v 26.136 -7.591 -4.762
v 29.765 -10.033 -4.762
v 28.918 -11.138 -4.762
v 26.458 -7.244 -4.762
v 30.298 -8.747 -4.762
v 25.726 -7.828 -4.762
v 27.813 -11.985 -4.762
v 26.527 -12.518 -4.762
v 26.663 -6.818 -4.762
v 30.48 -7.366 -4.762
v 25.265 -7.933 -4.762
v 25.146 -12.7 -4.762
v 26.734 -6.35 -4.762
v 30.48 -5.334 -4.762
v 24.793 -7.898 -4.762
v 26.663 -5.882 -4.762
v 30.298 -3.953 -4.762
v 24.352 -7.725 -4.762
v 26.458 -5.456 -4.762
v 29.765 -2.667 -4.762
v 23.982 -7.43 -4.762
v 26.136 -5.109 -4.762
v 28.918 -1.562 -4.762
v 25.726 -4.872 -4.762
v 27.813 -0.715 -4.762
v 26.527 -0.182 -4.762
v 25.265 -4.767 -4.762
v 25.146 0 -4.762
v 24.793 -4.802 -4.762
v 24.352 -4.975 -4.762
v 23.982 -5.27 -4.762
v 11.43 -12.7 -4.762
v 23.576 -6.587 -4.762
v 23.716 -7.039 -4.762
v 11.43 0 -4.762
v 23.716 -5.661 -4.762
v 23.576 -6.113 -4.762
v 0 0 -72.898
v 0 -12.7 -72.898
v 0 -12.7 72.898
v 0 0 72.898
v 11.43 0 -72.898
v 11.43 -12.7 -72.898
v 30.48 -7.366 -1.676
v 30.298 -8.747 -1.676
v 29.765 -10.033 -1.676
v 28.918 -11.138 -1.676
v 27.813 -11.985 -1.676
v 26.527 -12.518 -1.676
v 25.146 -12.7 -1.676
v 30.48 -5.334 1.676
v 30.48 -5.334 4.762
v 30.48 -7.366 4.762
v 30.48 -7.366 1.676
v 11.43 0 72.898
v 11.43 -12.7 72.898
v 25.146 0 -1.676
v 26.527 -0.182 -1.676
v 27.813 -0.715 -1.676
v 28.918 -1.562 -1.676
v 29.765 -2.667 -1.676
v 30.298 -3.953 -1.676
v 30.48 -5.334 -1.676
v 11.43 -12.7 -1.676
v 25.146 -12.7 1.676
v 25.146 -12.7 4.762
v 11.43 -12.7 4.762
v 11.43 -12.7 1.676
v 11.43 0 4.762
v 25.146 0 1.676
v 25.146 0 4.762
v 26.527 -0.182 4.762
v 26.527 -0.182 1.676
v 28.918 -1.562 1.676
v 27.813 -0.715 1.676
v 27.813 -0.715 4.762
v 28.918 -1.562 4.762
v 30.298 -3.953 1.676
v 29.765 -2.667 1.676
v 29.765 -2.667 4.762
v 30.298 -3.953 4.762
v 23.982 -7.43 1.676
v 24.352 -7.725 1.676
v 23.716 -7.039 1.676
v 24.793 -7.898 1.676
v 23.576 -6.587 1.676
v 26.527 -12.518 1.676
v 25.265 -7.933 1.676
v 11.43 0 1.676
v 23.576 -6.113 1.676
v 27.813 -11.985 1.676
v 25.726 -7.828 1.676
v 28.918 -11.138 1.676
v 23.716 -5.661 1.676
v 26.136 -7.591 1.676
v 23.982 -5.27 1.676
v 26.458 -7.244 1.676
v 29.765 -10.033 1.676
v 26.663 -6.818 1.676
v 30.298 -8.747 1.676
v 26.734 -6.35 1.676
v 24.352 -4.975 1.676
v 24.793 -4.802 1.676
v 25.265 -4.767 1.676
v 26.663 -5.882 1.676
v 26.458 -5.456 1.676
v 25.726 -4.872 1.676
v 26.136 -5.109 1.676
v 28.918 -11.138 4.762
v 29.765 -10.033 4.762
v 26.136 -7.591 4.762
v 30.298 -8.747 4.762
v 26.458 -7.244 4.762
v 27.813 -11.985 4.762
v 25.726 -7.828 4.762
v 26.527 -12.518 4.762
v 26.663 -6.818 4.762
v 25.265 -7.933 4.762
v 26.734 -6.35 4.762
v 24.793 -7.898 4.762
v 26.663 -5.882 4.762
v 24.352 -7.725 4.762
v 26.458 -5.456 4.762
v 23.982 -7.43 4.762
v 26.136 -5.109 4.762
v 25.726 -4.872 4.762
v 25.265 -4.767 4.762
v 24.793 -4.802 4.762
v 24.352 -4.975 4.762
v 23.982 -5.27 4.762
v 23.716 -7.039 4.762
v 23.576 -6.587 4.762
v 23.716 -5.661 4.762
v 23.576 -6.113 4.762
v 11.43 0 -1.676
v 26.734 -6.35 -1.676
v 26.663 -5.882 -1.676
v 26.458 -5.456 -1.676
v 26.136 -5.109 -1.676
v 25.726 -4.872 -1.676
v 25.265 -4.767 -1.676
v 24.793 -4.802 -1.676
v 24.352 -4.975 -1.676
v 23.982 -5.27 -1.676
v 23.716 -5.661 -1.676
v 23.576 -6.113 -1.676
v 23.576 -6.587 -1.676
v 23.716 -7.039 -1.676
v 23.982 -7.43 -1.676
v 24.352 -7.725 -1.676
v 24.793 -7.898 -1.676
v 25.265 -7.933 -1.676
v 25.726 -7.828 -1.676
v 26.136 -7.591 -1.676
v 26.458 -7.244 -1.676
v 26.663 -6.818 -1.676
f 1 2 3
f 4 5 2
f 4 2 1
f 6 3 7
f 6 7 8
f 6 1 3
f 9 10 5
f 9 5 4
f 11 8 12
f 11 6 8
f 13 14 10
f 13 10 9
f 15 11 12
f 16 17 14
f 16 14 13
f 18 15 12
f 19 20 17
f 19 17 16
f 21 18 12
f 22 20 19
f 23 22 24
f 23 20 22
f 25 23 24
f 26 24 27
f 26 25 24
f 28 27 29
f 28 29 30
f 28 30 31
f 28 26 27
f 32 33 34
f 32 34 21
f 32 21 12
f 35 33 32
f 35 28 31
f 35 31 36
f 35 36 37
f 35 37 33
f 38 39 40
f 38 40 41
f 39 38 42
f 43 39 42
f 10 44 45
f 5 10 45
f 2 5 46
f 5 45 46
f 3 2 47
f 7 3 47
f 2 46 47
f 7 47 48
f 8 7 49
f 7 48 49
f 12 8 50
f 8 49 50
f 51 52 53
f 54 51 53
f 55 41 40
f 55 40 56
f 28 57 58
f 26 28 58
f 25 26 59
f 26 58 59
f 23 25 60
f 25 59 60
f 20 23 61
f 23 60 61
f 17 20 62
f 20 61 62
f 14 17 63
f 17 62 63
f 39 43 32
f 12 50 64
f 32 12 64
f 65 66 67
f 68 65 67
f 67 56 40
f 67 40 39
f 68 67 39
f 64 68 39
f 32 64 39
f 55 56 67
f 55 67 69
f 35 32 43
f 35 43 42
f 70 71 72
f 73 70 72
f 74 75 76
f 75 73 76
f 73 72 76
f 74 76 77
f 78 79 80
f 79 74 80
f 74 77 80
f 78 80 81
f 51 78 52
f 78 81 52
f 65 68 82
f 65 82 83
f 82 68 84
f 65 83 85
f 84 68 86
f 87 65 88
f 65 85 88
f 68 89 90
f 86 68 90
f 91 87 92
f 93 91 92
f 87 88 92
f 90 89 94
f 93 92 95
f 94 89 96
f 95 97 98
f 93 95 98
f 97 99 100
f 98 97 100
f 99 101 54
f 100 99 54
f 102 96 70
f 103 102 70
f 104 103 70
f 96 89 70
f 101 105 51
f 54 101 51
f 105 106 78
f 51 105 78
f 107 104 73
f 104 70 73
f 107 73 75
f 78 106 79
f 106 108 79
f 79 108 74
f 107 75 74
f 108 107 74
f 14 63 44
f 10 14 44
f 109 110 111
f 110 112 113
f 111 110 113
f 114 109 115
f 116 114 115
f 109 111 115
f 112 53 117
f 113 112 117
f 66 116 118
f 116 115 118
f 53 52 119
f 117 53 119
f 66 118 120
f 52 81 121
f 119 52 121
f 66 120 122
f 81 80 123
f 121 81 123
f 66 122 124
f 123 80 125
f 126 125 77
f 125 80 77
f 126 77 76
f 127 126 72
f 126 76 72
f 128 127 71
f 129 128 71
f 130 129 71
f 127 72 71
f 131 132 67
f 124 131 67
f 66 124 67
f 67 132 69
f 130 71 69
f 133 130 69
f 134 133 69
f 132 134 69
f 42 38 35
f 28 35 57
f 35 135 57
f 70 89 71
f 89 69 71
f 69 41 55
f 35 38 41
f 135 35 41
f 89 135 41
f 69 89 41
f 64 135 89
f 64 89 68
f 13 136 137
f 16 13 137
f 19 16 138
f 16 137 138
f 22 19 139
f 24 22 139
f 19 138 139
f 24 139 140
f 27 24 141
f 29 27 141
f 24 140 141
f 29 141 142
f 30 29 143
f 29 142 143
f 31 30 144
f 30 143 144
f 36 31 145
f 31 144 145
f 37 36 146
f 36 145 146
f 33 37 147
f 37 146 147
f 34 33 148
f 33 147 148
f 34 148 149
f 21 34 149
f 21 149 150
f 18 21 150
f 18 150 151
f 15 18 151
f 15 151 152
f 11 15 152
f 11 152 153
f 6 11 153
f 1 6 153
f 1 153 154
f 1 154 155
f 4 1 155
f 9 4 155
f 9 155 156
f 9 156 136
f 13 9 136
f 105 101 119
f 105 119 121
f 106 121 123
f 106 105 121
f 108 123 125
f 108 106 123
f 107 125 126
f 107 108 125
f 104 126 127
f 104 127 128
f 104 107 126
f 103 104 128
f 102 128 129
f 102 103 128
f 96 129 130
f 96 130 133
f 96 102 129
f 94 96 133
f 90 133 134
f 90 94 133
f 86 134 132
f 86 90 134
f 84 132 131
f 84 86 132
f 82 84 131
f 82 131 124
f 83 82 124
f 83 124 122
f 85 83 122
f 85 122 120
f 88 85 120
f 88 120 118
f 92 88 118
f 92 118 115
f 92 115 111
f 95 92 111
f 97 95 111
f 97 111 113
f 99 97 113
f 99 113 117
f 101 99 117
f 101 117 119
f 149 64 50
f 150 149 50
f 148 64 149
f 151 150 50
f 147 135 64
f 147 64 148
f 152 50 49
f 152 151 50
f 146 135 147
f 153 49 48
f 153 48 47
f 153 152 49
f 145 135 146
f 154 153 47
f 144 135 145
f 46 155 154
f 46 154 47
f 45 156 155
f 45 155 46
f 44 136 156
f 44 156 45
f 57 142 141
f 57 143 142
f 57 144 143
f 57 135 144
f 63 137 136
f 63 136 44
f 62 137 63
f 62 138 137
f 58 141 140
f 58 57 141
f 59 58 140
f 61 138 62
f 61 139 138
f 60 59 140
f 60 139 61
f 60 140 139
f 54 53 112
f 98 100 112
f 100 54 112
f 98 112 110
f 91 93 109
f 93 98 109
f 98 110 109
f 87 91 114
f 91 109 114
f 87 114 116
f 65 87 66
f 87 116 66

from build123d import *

# Parameters (mm, degrees)
SKETCH1_W                = 11.43
SKETCH1_H                = 12.7
BOSS_EXTRUDE1_DEPTH      = 72.898
BOSS_EXTRUDE1_DEPTH_BACK = 72.898
SKETCH2_R                = 1.5875
BOSS_EXTRUDE2_DEPTH      = 4.7625
BOSS_EXTRUDE2_DEPTH_BACK = 4.7625
CUT_EXTRUDE1_DEPTH       = 1.6764
CUT_EXTRUDE1_DEPTH_BACK  = 1.6764


with BuildPart() as part:
    # Sketch1 → Boss-Extrude1 (new body, two sides)
    with BuildSketch(Plane.XY) as boss_extrude1_sk:
        with Locations((5.715, -6.35)):
            Rectangle(SKETCH1_W, SKETCH1_H)
    extrude(amount=BOSS_EXTRUDE1_DEPTH)
    extrude(boss_extrude1_sk.sketch, amount=-BOSS_EXTRUDE1_DEPTH_BACK)

    # Sketch2 → Boss-Extrude2 (add, two sides)
    with BuildSketch(Plane.XY) as boss_extrude2_sk:
        with BuildLine():
            Line((11.43, 0), (25.146, 0))
            ThreePointArc((25.146, 0), (28.917707571, -1.562292429), (30.48, -5.334))
            Line((30.48, -5.334), (30.48, -7.366))
            ThreePointArc((30.48, -7.366), (28.917707571, -11.137707571), (25.146, -12.7))
            Line((25.146, -12.7), (11.43, -12.7))
            Line((11.43, -12.7), (11.43, 0))
        make_face()
        with Locations((25.146, -6.35)):
            Circle(SKETCH2_R, mode=Mode.SUBTRACT)
    extrude(amount=BOSS_EXTRUDE2_DEPTH)
    extrude(boss_extrude2_sk.sketch, amount=-BOSS_EXTRUDE2_DEPTH_BACK)

    # Sketch3 → Cut-Extrude1 (cut, two sides)
    with BuildSketch(Plane.XY) as cut_extrude1_sk:
        with BuildLine():
            Line((11.43, 0), (11.43, -12.7))
            Line((11.43, -12.7), (25.146, -12.7))
            ThreePointArc((25.146, -12.7), (28.917707571, -11.137707571), (30.48, -7.366))
            Line((30.48, -7.366), (30.48, -5.334))
            ThreePointArc((30.48, -5.334), (28.917707571, -1.562292429), (25.146, 0))
            Line((25.146, 0), (11.43, 0))
        make_face()
    extrude(amount=CUT_EXTRUDE1_DEPTH, mode=Mode.SUBTRACT)
    extrude(cut_extrude1_sk.sketch, amount=-CUT_EXTRUDE1_DEPTH_BACK, mode=Mode.SUBTRACT)


solid = part.part
